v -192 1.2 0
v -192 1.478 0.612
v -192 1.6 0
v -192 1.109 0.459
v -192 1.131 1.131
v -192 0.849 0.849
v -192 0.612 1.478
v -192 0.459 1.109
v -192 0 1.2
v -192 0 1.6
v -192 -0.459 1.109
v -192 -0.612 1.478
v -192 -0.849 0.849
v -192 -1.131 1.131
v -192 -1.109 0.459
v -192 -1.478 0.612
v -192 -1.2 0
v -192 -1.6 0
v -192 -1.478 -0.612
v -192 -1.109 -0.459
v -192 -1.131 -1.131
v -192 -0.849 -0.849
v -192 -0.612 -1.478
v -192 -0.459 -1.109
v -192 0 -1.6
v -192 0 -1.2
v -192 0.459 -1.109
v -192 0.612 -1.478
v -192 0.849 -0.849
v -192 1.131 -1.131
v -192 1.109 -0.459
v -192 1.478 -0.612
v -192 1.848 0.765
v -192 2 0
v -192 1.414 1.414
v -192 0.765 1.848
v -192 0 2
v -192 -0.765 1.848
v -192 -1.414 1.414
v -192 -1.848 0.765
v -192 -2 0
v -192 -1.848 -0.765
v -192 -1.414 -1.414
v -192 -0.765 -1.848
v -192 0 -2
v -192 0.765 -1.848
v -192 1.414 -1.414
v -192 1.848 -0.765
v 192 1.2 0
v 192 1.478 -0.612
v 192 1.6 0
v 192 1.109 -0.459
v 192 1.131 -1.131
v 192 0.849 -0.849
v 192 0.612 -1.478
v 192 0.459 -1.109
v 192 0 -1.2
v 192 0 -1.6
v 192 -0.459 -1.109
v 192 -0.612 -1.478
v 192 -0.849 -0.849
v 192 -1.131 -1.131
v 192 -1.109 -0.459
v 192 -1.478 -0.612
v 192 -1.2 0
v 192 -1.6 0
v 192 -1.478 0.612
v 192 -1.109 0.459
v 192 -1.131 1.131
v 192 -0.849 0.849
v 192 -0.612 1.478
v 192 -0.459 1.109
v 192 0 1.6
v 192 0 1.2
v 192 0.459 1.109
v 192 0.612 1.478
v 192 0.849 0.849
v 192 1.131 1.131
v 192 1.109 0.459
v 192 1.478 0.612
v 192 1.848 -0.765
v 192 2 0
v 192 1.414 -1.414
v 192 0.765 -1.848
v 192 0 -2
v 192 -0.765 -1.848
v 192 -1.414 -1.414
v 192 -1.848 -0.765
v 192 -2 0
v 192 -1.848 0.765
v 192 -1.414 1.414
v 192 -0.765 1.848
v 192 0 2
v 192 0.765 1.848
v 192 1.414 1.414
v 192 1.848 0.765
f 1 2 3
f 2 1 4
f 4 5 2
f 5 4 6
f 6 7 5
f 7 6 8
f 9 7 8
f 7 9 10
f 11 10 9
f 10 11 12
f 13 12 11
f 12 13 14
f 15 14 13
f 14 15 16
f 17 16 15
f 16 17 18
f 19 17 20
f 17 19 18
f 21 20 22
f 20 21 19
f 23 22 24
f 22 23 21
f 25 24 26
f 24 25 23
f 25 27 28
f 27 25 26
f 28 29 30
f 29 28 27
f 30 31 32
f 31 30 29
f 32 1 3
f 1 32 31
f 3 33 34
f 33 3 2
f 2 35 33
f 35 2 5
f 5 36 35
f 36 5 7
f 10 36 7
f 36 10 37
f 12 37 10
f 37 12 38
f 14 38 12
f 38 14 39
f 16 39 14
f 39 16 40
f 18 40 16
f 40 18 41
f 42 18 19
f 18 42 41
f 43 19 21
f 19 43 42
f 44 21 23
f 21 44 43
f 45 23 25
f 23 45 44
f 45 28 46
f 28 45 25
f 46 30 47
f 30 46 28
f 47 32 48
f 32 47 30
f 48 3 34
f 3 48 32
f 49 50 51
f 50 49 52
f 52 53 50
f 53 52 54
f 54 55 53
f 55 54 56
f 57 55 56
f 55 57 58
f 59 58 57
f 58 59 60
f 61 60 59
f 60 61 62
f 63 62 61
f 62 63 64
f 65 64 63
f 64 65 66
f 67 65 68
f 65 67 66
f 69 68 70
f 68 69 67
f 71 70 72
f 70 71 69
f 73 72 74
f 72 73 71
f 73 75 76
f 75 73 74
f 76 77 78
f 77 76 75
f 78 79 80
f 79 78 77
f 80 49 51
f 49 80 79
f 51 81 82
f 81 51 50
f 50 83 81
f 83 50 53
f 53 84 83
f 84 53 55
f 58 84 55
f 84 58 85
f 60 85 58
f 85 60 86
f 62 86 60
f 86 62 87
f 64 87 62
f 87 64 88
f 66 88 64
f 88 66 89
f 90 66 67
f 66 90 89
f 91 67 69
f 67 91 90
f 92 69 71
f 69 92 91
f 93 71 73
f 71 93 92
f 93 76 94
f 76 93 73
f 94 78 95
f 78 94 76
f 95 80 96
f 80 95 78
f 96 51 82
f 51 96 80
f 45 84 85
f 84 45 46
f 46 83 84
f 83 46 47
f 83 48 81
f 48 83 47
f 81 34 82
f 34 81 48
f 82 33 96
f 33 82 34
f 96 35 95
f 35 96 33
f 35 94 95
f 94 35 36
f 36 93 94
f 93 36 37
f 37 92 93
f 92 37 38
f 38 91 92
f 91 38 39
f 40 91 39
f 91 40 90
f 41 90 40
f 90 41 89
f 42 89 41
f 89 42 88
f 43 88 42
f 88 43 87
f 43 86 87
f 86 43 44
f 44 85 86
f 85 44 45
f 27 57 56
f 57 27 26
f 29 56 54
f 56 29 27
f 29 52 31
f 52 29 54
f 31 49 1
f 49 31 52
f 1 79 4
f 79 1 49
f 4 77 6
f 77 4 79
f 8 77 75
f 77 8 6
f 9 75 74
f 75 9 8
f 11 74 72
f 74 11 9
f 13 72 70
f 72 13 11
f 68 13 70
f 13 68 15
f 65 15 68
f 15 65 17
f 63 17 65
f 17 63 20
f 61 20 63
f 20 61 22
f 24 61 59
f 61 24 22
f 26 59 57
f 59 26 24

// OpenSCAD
// file: ../p/4-4cyli.scad
use <../lib.scad>
function ldraw_lib__4_4cyli() = [
// 0 Cylinder 1.0
// 0 Name: 4-4cyli.dat
// 0 Author: James Jessiman
// 0 !LDRAW_ORG Primitive UPDATE 2005-01
// 0 !LICENSE Licensed under CC BY 2.0 and CC BY 4.0 : see CAreadme.txt
// 
// 0 BFC CERTIFY CCW
  [0,"BFC","CERTIFY"],
  [0,"BFC","CCW"],
// 
// 0 !HISTORY 1998-12-15 [PTadmin] Official Update 1998-10
// 0 !HISTORY 2002-03-23 [sbliss] Added BFC statement; merged headers from files in distributions LDraw 0.27 and Complete.
// 0 !HISTORY 2002-04-25 [PTadmin] Official Update 2002-02
// 0 !HISTORY 2004-12-14 [guyvivan] BFC CCW
// 0 !HISTORY 2005-12-28 [PTadmin] Official Update 2005-01
// 0 !HISTORY 2007-06-24 [PTadmin] Header formatted for Contributor Agreement
// 0 !HISTORY 2008-07-01 [PTadmin] Official Update 2008-01
// 
// 
// 4 16 1 1 0 0.9239 1 0.3827 0.9239 0 0.3827 1 0 0
  [4,16,1,1,0,0.9239,1,0.3827,0.9239,0,0.3827,1,0,0],
// 5 24 1 0 0 1 1 0 0.9239 0 0.3827 0.9239 0 -0.3827
  [5,24,1,0,0,1,1,0,0.9239,0,0.3827,0.9239,0,-0.3827],
// 4 16 0.9239 1 0.3827 0.7071 1 0.7071 0.7071 0 0.7071 0.9239 0 0.3827
  [4,16,0.9239,1,0.3827,0.7071,1,0.7071,0.7071,0,0.7071,0.9239,0,0.3827],
// 5 24 0.9239 0 0.3827 0.9239 1 0.3827 0.7071 0 0.7071 1 0 0
  [5,24,0.9239,0,0.3827,0.9239,1,0.3827,0.7071,0,0.7071,1,0,0],
// 4 16 0.7071 1 0.7071 0.3827 1 0.9239 0.3827 0 0.9239 0.7071 0 0.7071
  [4,16,0.7071,1,0.7071,0.3827,1,0.9239,0.3827,0,0.9239,0.7071,0,0.7071],
// 5 24 0.7071 0 0.7071 0.7071 1 0.7071 0.3827 0 0.9239 0.9239 0 0.3827
  [5,24,0.7071,0,0.7071,0.7071,1,0.7071,0.3827,0,0.9239,0.9239,0,0.3827],
// 4 16 0.3827 1 0.9239 0 1 1 0 0 1 0.3827 0 0.9239
  [4,16,0.3827,1,0.9239,0,1,1,0,0,1,0.3827,0,0.9239],
// 5 24 0.3827 0 0.9239 0.3827 1 0.9239 0 0 1 0.7071 0 0.7071
  [5,24,0.3827,0,0.9239,0.3827,1,0.9239,0,0,1,0.7071,0,0.7071],
// 4 16 0 1 1 -0.3827 1 0.9239 -0.3827 0 0.9239 0 0 1
  [4,16,0,1,1,-0.3827,1,0.9239,-0.3827,0,0.9239,0,0,1],
// 5 24 0 0 1 0 1 1 -0.3827 0 0.9239 0.3827 0 0.9239
  [5,24,0,0,1,0,1,1,-0.3827,0,0.9239,0.3827,0,0.9239],
// 4 16 -0.3827 1 0.9239 -0.7071 1 0.7071 -0.7071 0 0.7071 -0.3827 0 0.9239
  [4,16,-0.3827,1,0.9239,-0.7071,1,0.7071,-0.7071,0,0.7071,-0.3827,0,0.9239],
// 5 24 -0.3827 0 0.9239 -0.3827 1 0.9239 -0.7071 0 0.7071 0 0 1
  [5,24,-0.3827,0,0.9239,-0.3827,1,0.9239,-0.7071,0,0.7071,0,0,1],
// 4 16 -0.7071 1 0.7071 -0.9239 1 0.3827 -0.9239 0 0.3827 -0.7071 0 0.7071
  [4,16,-0.7071,1,0.7071,-0.9239,1,0.3827,-0.9239,0,0.3827,-0.7071,0,0.7071],
// 5 24 -0.7071 0 0.7071 -0.7071 1 0.7071 -0.9239 0 0.3827 -0.3827 0 0.9239
  [5,24,-0.7071,0,0.7071,-0.7071,1,0.7071,-0.9239,0,0.3827,-0.3827,0,0.9239],
// 4 16 -0.9239 1 0.3827 -1 1 0 -1 0 0 -0.9239 0 0.3827
  [4,16,-0.9239,1,0.3827,-1,1,0,-1,0,0,-0.9239,0,0.3827],
// 5 24 -0.9239 0 0.3827 -0.9239 1 0.3827 -1 0 0 -0.7071 0 0.7071
  [5,24,-0.9239,0,0.3827,-0.9239,1,0.3827,-1,0,0,-0.7071,0,0.7071],
// 4 16 -1 1 0 -0.9239 1 -0.3827 -0.9239 0 -0.3827 -1 0 0
  [4,16,-1,1,0,-0.9239,1,-0.3827,-0.9239,0,-0.3827,-1,0,0],
// 5 24 -1 0 0 -1 1 0 -0.9239 0 -0.3827 -0.9239 0 0.3827
  [5,24,-1,0,0,-1,1,0,-0.9239,0,-0.3827,-0.9239,0,0.3827],
// 4 16 -0.9239 1 -0.3827 -0.7071 1 -0.7071 -0.7071 0 -0.7071 -0.9239 0 -0.3827
  [4,16,-0.9239,1,-0.3827,-0.7071,1,-0.7071,-0.7071,0,-0.7071,-0.9239,0,-0.3827],
// 5 24 -0.9239 0 -0.3827 -0.9239 1 -0.3827 -0.7071 0 -0.7071 -1 0 0
  [5,24,-0.9239,0,-0.3827,-0.9239,1,-0.3827,-0.7071,0,-0.7071,-1,0,0],
// 4 16 -0.7071 1 -0.7071 -0.3827 1 -0.9239 -0.3827 0 -0.9239 -0.7071 0 -0.7071
  [4,16,-0.7071,1,-0.7071,-0.3827,1,-0.9239,-0.3827,0,-0.9239,-0.7071,0,-0.7071],
// 5 24 -0.7071 0 -0.7071 -0.7071 1 -0.7071 -0.3827 0 -0.9239 -0.9239 0 -0.3827
  [5,24,-0.7071,0,-0.7071,-0.7071,1,-0.7071,-0.3827,0,-0.9239,-0.9239,0,-0.3827],
// 4 16 -0.3827 1 -0.9239 0 1 -1 0 0 -1 -0.3827 0 -0.9239
  [4,16,-0.3827,1,-0.9239,0,1,-1,0,0,-1,-0.3827,0,-0.9239],
// 5 24 -0.3827 0 -0.9239 -0.3827 1 -0.9239 0 0 -1 -0.7071 0 -0.7071
  [5,24,-0.3827,0,-0.9239,-0.3827,1,-0.9239,0,0,-1,-0.7071,0,-0.7071],
// 4 16 0 1 -1 0.3827 1 -0.9239 0.3827 0 -0.9239 0 0 -1
  [4,16,0,1,-1,0.3827,1,-0.9239,0.3827,0,-0.9239,0,0,-1],
// 5 24 0 0 -1 0 1 -1 0.3827 0 -0.9239 -0.3827 0 -0.9239
  [5,24,0,0,-1,0,1,-1,0.3827,0,-0.9239,-0.3827,0,-0.9239],
// 4 16 0.3827 1 -0.9239 0.7071 1 -0.7071 0.7071 0 -0.7071 0.3827 0 -0.9239
  [4,16,0.3827,1,-0.9239,0.7071,1,-0.7071,0.7071,0,-0.7071,0.3827,0,-0.9239],
// 5 24 0.3827 0 -0.9239 0.3827 1 -0.9239 0.7071 0 -0.7071 0 0 -1
  [5,24,0.3827,0,-0.9239,0.3827,1,-0.9239,0.7071,0,-0.7071,0,0,-1],
// 4 16 0.7071 1 -0.7071 0.9239 1 -0.3827 0.9239 0 -0.3827 0.7071 0 -0.7071
  [4,16,0.7071,1,-0.7071,0.9239,1,-0.3827,0.9239,0,-0.3827,0.7071,0,-0.7071],
// 5 24 0.7071 0 -0.7071 0.7071 1 -0.7071 0.9239 0 -0.3827 0.3827 0 -0.9239
  [5,24,0.7071,0,-0.7071,0.7071,1,-0.7071,0.9239,0,-0.3827,0.3827,0,-0.9239],
// 4 16 0.9239 1 -0.3827 1 1 0 1 0 0 0.9239 0 -0.3827
  [4,16,0.9239,1,-0.3827,1,1,0,1,0,0,0.9239,0,-0.3827],
// 5 24 0.9239 0 -0.3827 0.9239 1 -0.3827 1 0 0 0.7071 0 -0.7071
  [5,24,0.9239,0,-0.3827,0.9239,1,-0.3827,1,0,0,0.7071,0,-0.7071],
// 0
];
makepoly(ldraw_lib__4_4cyli(), line=0.2);
// file: ../p/4-4ring4.scad
use <../lib.scad>
function ldraw_lib__4_4ring4() = [
// 0 Ring  4 x 1.0
// 0 Name: 4-4ring4.dat
// 0 Author: James Jessiman
// 0 !LDRAW_ORG Primitive UPDATE 2009-01
// 0 !LICENSE Licensed under CC BY 2.0 and CC BY 4.0 : see CAreadme.txt
// 
// 0 BFC CERTIFY CCW
  [0,"BFC","CERTIFY"],
  [0,"BFC","CCW"],
// 
// 0 !HISTORY 1998-12-15 [PTadmin] Official Update 1998-10
// 0 !HISTORY 2002-04-08 [BrickCaster] Modified for BFC compliance
// 0 !HISTORY 2002-04-25 [PTadmin] Official Update 2002-02
// 0 !HISTORY 2007-06-24 [PTadmin] Header formatted for Contributor Agreement
// 0 !HISTORY 2008-07-01 [PTadmin] Official Update 2008-01
// 0 !HISTORY 2008-08-26 [cwdee] Switch polygon winding and rename
// 0 !HISTORY 2009-05-02 [PTadmin] Official Update 2009-01
// 
// 
// 4 16 -1.9135 0 4.6195 -1.5308 0 3.6956 0 0 4 0 0 5
  [4,16,-1.9135,0,4.6195,-1.5308,0,3.6956,0,0,4,0,0,5],
// 4 16 -3.5355 0 3.5355 -2.8284 0 2.8284 -1.5308 0 3.6956 -1.9135 0 4.6195
  [4,16,-3.5355,0,3.5355,-2.8284,0,2.8284,-1.5308,0,3.6956,-1.9135,0,4.6195],
// 4 16 -4.6195 0 1.9135 -3.6956 0 1.5308 -2.8284 0 2.8284 -3.5355 0 3.5355
  [4,16,-4.6195,0,1.9135,-3.6956,0,1.5308,-2.8284,0,2.8284,-3.5355,0,3.5355],
// 4 16 -5 0 0 -4 0 0 -3.6956 0 1.5308 -4.6195 0 1.9135
  [4,16,-5,0,0,-4,0,0,-3.6956,0,1.5308,-4.6195,0,1.9135],
// 4 16 -4.6195 0 -1.9135 -3.6956 0 -1.5308 -4 0 0 -5 0 0
  [4,16,-4.6195,0,-1.9135,-3.6956,0,-1.5308,-4,0,0,-5,0,0],
// 4 16 -3.5355 0 -3.5355 -2.8284 0 -2.8284 -3.6956 0 -1.5308 -4.6195 0 -1.9135
  [4,16,-3.5355,0,-3.5355,-2.8284,0,-2.8284,-3.6956,0,-1.5308,-4.6195,0,-1.9135],
// 4 16 -1.9135 0 -4.6195 -1.5308 0 -3.6956 -2.8284 0 -2.8284 -3.5355 0 -3.5355
  [4,16,-1.9135,0,-4.6195,-1.5308,0,-3.6956,-2.8284,0,-2.8284,-3.5355,0,-3.5355],
// 4 16 0 0 -5 0 0 -4 -1.5308 0 -3.6956 -1.9135 0 -4.6195
  [4,16,0,0,-5,0,0,-4,-1.5308,0,-3.6956,-1.9135,0,-4.6195],
// 4 16 1.9135 0 -4.6195 1.5308 0 -3.6956 0 0 -4 0 0 -5
  [4,16,1.9135,0,-4.6195,1.5308,0,-3.6956,0,0,-4,0,0,-5],
// 4 16 3.5355 0 -3.5355 2.8284 0 -2.8284 1.5308 0 -3.6956 1.9135 0 -4.6195
  [4,16,3.5355,0,-3.5355,2.8284,0,-2.8284,1.5308,0,-3.6956,1.9135,0,-4.6195],
// 4 16 4.6195 0 -1.9135 3.6956 0 -1.5308 2.8284 0 -2.8284 3.5355 0 -3.5355
  [4,16,4.6195,0,-1.9135,3.6956,0,-1.5308,2.8284,0,-2.8284,3.5355,0,-3.5355],
// 4 16 5 0 0 4 0 0 3.6956 0 -1.5308 4.6195 0 -1.9135
  [4,16,5,0,0,4,0,0,3.6956,0,-1.5308,4.6195,0,-1.9135],
// 4 16 4.6195 0 1.9135 3.6956 0 1.5308 4 0 0 5 0 0
  [4,16,4.6195,0,1.9135,3.6956,0,1.5308,4,0,0,5,0,0],
// 4 16 3.5355 0 3.5355 2.8284 0 2.8284 3.6956 0 1.5308 4.6195 0 1.9135
  [4,16,3.5355,0,3.5355,2.8284,0,2.8284,3.6956,0,1.5308,4.6195,0,1.9135],
// 4 16 1.9135 0 4.6195 1.5308 0 3.6956 2.8284 0 2.8284 3.5355 0 3.5355
  [4,16,1.9135,0,4.6195,1.5308,0,3.6956,2.8284,0,2.8284,3.5355,0,3.5355],
// 4 16 0 0 5 0 0 4 1.5308 0 3.6956 1.9135 0 4.6195
  [4,16,0,0,5,0,0,4,1.5308,0,3.6956,1.9135,0,4.6195],
// 0
];
makepoly(ldraw_lib__4_4ring4(), line=0.2);
// file: ../p/4-4ring3.scad
use <../lib.scad>
function ldraw_lib__4_4ring3() = [
// 0 Ring  3 x 1.0
// 0 Name: 4-4ring3.dat
// 0 Author: James Jessiman
// 0 !LDRAW_ORG Primitive UPDATE 2009-01
// 0 !LICENSE Licensed under CC BY 2.0 and CC BY 4.0 : see CAreadme.txt
// 
// 0 BFC CERTIFY CCW
  [0,"BFC","CERTIFY"],
  [0,"BFC","CCW"],
// 
// 0 !HISTORY 1998-12-15 [PTadmin] Official Update 1998-10
// 0 !HISTORY 2002-04-05 [hafhead] Added BFC statement
// 0 !HISTORY 2002-04-25 [PTadmin] Official Update 2002-02
// 0 !HISTORY 2007-06-24 [PTadmin] Header formatted for Contributor Agreement
// 0 !HISTORY 2008-07-01 [PTadmin] Official Update 2008-01
// 0 !HISTORY 2008-08-26 [cwdee] Switch polygon winding and rename
// 0 !HISTORY 2009-05-02 [PTadmin] Official Update 2009-01
// 
// 
// 4 16 -1.5308 0 3.6956 -1.1481 0 2.7717 0 0 3 0 0 4
  [4,16,-1.5308,0,3.6956,-1.1481,0,2.7717,0,0,3,0,0,4],
// 4 16 -2.8284 0 2.8284 -2.1213 0 2.1213 -1.1481 0 2.7717 -1.5308 0 3.6956
  [4,16,-2.8284,0,2.8284,-2.1213,0,2.1213,-1.1481,0,2.7717,-1.5308,0,3.6956],
// 4 16 -3.6956 0 1.5308 -2.7717 0 1.1481 -2.1213 0 2.1213 -2.8284 0 2.8284
  [4,16,-3.6956,0,1.5308,-2.7717,0,1.1481,-2.1213,0,2.1213,-2.8284,0,2.8284],
// 4 16 -4 0 0 -3 0 0 -2.7717 0 1.1481 -3.6956 0 1.5308
  [4,16,-4,0,0,-3,0,0,-2.7717,0,1.1481,-3.6956,0,1.5308],
// 4 16 -3.6956 0 -1.5308 -2.7717 0 -1.1481 -3 0 0 -4 0 0
  [4,16,-3.6956,0,-1.5308,-2.7717,0,-1.1481,-3,0,0,-4,0,0],
// 4 16 -2.8284 0 -2.8284 -2.1213 0 -2.1213 -2.7717 0 -1.1481 -3.6956 0 -1.5308
  [4,16,-2.8284,0,-2.8284,-2.1213,0,-2.1213,-2.7717,0,-1.1481,-3.6956,0,-1.5308],
// 4 16 -1.5308 0 -3.6956 -1.1481 0 -2.7717 -2.1213 0 -2.1213 -2.8284 0 -2.8284
  [4,16,-1.5308,0,-3.6956,-1.1481,0,-2.7717,-2.1213,0,-2.1213,-2.8284,0,-2.8284],
// 4 16 0 0 -4 0 0 -3 -1.1481 0 -2.7717 -1.5308 0 -3.6956
  [4,16,0,0,-4,0,0,-3,-1.1481,0,-2.7717,-1.5308,0,-3.6956],
// 4 16 1.5308 0 -3.6956 1.1481 0 -2.7717 0 0 -3 0 0 -4
  [4,16,1.5308,0,-3.6956,1.1481,0,-2.7717,0,0,-3,0,0,-4],
// 4 16 2.8284 0 -2.8284 2.1213 0 -2.1213 1.1481 0 -2.7717 1.5308 0 -3.6956
  [4,16,2.8284,0,-2.8284,2.1213,0,-2.1213,1.1481,0,-2.7717,1.5308,0,-3.6956],
// 4 16 3.6956 0 -1.5308 2.7717 0 -1.1481 2.1213 0 -2.1213 2.8284 0 -2.8284
  [4,16,3.6956,0,-1.5308,2.7717,0,-1.1481,2.1213,0,-2.1213,2.8284,0,-2.8284],
// 4 16 4 0 0 3 0 0 2.7717 0 -1.1481 3.6956 0 -1.5308
  [4,16,4,0,0,3,0,0,2.7717,0,-1.1481,3.6956,0,-1.5308],
// 4 16 3.6956 0 1.5308 2.7717 0 1.1481 3 0 0 4 0 0
  [4,16,3.6956,0,1.5308,2.7717,0,1.1481,3,0,0,4,0,0],
// 4 16 2.8284 0 2.8284 2.1213 0 2.1213 2.7717 0 1.1481 3.6956 0 1.5308
  [4,16,2.8284,0,2.8284,2.1213,0,2.1213,2.7717,0,1.1481,3.6956,0,1.5308],
// 4 16 1.5308 0 3.6956 1.1481 0 2.7717 2.1213 0 2.1213 2.8284 0 2.8284
  [4,16,1.5308,0,3.6956,1.1481,0,2.7717,2.1213,0,2.1213,2.8284,0,2.8284],
// 4 16 0 0 4 0 0 3 1.1481 0 2.7717 1.5308 0 3.6956
  [4,16,0,0,4,0,0,3,1.1481,0,2.7717,1.5308,0,3.6956],
// 0
];
makepoly(ldraw_lib__4_4ring3(), line=0.2);
// file: ../p/4-4edge.scad
use <../lib.scad>
function ldraw_lib__4_4edge() = [
// 0 Circle 1.0
// 0 Name: 4-4edge.dat
// 0 Author: James Jessiman
// 0 !LDRAW_ORG Primitive UPDATE 2017-01
// 0 !LICENSE Licensed under CC BY 2.0 and CC BY 4.0 : see CAreadme.txt
// 
// 0 BFC CERTIFY CCW
  [0,"BFC","CERTIFY"],
  [0,"BFC","CCW"],
// 
// 0 !HISTORY 1998-12-15 [PTadmin] Official Update 1998-10
// 0 !HISTORY 2005-12-28 [PTadmin] Official Update 2005-01
// 0 !HISTORY 2007-06-24 [PTadmin] Header formatted for Contributor Agreement
// 0 !HISTORY 2008-07-01 [PTadmin] Official Update 2008-01
// 0 !HISTORY 2017-01-15 [Steffen] BFCed
// 0 !HISTORY 2017-12-30 [PTadmin] Official Update 2017-01
// 
// 
// 2 24 1 0 0 0.9239 0 0.3827
  [2,24,1,0,0,0.9239,0,0.3827],
// 2 24 0.9239 0 0.3827 0.7071 0 0.7071
  [2,24,0.9239,0,0.3827,0.7071,0,0.7071],
// 2 24 0.7071 0 0.7071 0.3827 0 0.9239
  [2,24,0.7071,0,0.7071,0.3827,0,0.9239],
// 2 24 0.3827 0 0.9239 0 0 1
  [2,24,0.3827,0,0.9239,0,0,1],
// 2 24 0 0 1 -0.3827 0 0.9239
  [2,24,0,0,1,-0.3827,0,0.9239],
// 2 24 -0.3827 0 0.9239 -0.7071 0 0.7071
  [2,24,-0.3827,0,0.9239,-0.7071,0,0.7071],
// 2 24 -0.7071 0 0.7071 -0.9239 0 0.3827
  [2,24,-0.7071,0,0.7071,-0.9239,0,0.3827],
// 2 24 -0.9239 0 0.3827 -1 0 -0
  [2,24,-0.9239,0,0.3827,-1,0,-0],
// 2 24 -1 0 -0 -0.9239 0 -0.3827
  [2,24,-1,0,-0,-0.9239,0,-0.3827],
// 2 24 -0.9239 0 -0.3827 -0.7071 0 -0.7071
  [2,24,-0.9239,0,-0.3827,-0.7071,0,-0.7071],
// 2 24 -0.7071 0 -0.7071 -0.3827 0 -0.9239
  [2,24,-0.7071,0,-0.7071,-0.3827,0,-0.9239],
// 2 24 -0.3827 0 -0.9239 0 0 -1
  [2,24,-0.3827,0,-0.9239,0,0,-1],
// 2 24 0 0 -1 0.3827 0 -0.9239
  [2,24,0,0,-1,0.3827,0,-0.9239],
// 2 24 0.3827 0 -0.9239 0.7071 0 -0.7071
  [2,24,0.3827,0,-0.9239,0.7071,0,-0.7071],
// 2 24 0.7071 0 -0.7071 0.9239 0 -0.3827
  [2,24,0.7071,0,-0.7071,0.9239,0,-0.3827],
// 2 24 0.9239 0 -0.3827 1 0 0
  [2,24,0.9239,0,-0.3827,1,0,0],
];
makepoly(ldraw_lib__4_4edge(), line=0.2);
// file: 71533k03.scad
use <../lib.scad>
use <../p/4-4cyli.scad>
function ldraw_lib__71533k03() = [
// 0 ~Technic Pneumatic Tube Segment
// 0 Name: 71533k03.dat
// 0 Author: Jaco van der Molen [Jaco]
// 0 !LDRAW_ORG Part Flexible_Section UPDATE 2020-01
// 0 !LICENSE Licensed under CC BY 2.0 and CC BY 4.0 : see CAreadme.txt
// 
// 0 BFC CERTIFY CW
  [0,"BFC","CERTIFY"],
  [0,"BFC","CW"],
// 
// 0 !HISTORY 2003-11-30 [Steffen] BFCed
// 0 !HISTORY 2009-12-29 [PTadmin] Official Update 2009-03
// 0 !HISTORY 2020-06-27 [PTadmin] Renamed from 166
// 0 !HISTORY 2020-06-28 [PTadmin] Official Update 2020-01
// 
// 
// 1 16 0 0 0 5 0 0 0 1 0 0 0 5 4-4cyli.dat
  [1,16,0,0,0,5,0,0,0,1,0,0,0,5, ldraw_lib__4_4cyli()],
// 0 BFC INVERTNEXT
  [0,"BFC","INVERTNEXT"],
// 1 16 0 0 0 3 0 0 0 1 0 0 0 3 4-4cyli.dat
  [1,16,0,0,0,3,0,0,0,1,0,0,0,3, ldraw_lib__4_4cyli()],
// 0
];
makepoly(ldraw_lib__71533k03(), line=0.2);
// file: 71533k02.scad
use <../lib.scad>
use <../p/4-4edge.scad>
use <../p/4-4ring3.scad>
use <../p/4-4ring4.scad>
function ldraw_lib__71533k02() = [
// 0 ~Technic Pneumatic Tube End (Non-Bulged)
// 0 Name: 71533k02.dat
// 0 Author: Steffen [Steffen]
// 0 !LDRAW_ORG Part Flexible_Section UPDATE 2020-01
// 0 !LICENSE Licensed under CC BY 2.0 and CC BY 4.0 : see CAreadme.txt
// 
// 0 BFC CERTIFY CCW
  [0,"BFC","CERTIFY"],
  [0,"BFC","CCW"],
// 
// 0 !HISTORY 2020-06-28 [PTadmin] Official Update 2020-01
// 
// 
// 0 // This file goes together with 71533k01.dat and 71533k03.dat.
// 0 // Those 3 files can be used to create Technic Pneumatic Tubes
// 0 // with either bulged or non-bulged ends.
// 
// 1 16 0 0 0 1 0 0 0 1 0 0 0 1 4-4ring3.dat
  [1,16,0,0,0,1,0,0,0,1,0,0,0,1, ldraw_lib__4_4ring3()],
// 1 16 0 0 0 1 0 0 0 1 0 0 0 1 4-4ring4.dat
  [1,16,0,0,0,1,0,0,0,1,0,0,0,1, ldraw_lib__4_4ring4()],
// 1 16 0 0 0 3 0 0 0 3 0 0 0 3 4-4edge.dat
  [1,16,0,0,0,3,0,0,0,3,0,0,0,3, ldraw_lib__4_4edge()],
// 1 16 0 0 0 5 0 0 0 5 0 0 0 5 4-4edge.dat
  [1,16,0,0,0,5,0,0,0,5,0,0,0,5, ldraw_lib__4_4edge()],
];
makepoly(ldraw_lib__71533k02(), line=0.2);
// main file
use <../lib.scad>
use <71533k02.scad>
use <71533k03.scad>
function ldraw_lib__26439_f1() = [
// 0 Technic Pneumatic Tube 48L
// 0 Name: 26439-f1.dat
// 0 Author: Philippe Hurbain [Philo]
// 0 !LDRAW_ORG Part UPDATE 2020-02
// 0 !LICENSE Licensed under CC BY 2.0 and CC BY 4.0 : see CAreadme.txt
// 
// 0 BFC CERTIFY CCW
  [0,"BFC","CERTIFY"],
  [0,"BFC","CCW"],
// 
// 0 !KEYWORDS 384 mm
// 
// 0 !HISTORY 2020-09-05 [PTadmin] Official Update 2020-02
// 
// 
// 1 16 -480 0 0 0 1 0 1 0 0 0 0 1 71533k02.dat
  [1,16,-480,0,0,0,1,0,1,0,0,0,0,1, ldraw_lib__71533k02()],
// 1 16 480 0 0 0 -1 0 -1 0 0 0 0 1 71533k02.dat
  [1,16,480,0,0,0,-1,0,-1,0,0,0,0,1, ldraw_lib__71533k02()],
// 1 16 -480 0 0 0 960 0 1 0 0 0 0 1 71533k03.dat
  [1,16,-480,0,0,0,960,0,1,0,0,0,0,1, ldraw_lib__71533k03()],
];
makepoly(ldraw_lib__26439_f1(), line=0.2);
